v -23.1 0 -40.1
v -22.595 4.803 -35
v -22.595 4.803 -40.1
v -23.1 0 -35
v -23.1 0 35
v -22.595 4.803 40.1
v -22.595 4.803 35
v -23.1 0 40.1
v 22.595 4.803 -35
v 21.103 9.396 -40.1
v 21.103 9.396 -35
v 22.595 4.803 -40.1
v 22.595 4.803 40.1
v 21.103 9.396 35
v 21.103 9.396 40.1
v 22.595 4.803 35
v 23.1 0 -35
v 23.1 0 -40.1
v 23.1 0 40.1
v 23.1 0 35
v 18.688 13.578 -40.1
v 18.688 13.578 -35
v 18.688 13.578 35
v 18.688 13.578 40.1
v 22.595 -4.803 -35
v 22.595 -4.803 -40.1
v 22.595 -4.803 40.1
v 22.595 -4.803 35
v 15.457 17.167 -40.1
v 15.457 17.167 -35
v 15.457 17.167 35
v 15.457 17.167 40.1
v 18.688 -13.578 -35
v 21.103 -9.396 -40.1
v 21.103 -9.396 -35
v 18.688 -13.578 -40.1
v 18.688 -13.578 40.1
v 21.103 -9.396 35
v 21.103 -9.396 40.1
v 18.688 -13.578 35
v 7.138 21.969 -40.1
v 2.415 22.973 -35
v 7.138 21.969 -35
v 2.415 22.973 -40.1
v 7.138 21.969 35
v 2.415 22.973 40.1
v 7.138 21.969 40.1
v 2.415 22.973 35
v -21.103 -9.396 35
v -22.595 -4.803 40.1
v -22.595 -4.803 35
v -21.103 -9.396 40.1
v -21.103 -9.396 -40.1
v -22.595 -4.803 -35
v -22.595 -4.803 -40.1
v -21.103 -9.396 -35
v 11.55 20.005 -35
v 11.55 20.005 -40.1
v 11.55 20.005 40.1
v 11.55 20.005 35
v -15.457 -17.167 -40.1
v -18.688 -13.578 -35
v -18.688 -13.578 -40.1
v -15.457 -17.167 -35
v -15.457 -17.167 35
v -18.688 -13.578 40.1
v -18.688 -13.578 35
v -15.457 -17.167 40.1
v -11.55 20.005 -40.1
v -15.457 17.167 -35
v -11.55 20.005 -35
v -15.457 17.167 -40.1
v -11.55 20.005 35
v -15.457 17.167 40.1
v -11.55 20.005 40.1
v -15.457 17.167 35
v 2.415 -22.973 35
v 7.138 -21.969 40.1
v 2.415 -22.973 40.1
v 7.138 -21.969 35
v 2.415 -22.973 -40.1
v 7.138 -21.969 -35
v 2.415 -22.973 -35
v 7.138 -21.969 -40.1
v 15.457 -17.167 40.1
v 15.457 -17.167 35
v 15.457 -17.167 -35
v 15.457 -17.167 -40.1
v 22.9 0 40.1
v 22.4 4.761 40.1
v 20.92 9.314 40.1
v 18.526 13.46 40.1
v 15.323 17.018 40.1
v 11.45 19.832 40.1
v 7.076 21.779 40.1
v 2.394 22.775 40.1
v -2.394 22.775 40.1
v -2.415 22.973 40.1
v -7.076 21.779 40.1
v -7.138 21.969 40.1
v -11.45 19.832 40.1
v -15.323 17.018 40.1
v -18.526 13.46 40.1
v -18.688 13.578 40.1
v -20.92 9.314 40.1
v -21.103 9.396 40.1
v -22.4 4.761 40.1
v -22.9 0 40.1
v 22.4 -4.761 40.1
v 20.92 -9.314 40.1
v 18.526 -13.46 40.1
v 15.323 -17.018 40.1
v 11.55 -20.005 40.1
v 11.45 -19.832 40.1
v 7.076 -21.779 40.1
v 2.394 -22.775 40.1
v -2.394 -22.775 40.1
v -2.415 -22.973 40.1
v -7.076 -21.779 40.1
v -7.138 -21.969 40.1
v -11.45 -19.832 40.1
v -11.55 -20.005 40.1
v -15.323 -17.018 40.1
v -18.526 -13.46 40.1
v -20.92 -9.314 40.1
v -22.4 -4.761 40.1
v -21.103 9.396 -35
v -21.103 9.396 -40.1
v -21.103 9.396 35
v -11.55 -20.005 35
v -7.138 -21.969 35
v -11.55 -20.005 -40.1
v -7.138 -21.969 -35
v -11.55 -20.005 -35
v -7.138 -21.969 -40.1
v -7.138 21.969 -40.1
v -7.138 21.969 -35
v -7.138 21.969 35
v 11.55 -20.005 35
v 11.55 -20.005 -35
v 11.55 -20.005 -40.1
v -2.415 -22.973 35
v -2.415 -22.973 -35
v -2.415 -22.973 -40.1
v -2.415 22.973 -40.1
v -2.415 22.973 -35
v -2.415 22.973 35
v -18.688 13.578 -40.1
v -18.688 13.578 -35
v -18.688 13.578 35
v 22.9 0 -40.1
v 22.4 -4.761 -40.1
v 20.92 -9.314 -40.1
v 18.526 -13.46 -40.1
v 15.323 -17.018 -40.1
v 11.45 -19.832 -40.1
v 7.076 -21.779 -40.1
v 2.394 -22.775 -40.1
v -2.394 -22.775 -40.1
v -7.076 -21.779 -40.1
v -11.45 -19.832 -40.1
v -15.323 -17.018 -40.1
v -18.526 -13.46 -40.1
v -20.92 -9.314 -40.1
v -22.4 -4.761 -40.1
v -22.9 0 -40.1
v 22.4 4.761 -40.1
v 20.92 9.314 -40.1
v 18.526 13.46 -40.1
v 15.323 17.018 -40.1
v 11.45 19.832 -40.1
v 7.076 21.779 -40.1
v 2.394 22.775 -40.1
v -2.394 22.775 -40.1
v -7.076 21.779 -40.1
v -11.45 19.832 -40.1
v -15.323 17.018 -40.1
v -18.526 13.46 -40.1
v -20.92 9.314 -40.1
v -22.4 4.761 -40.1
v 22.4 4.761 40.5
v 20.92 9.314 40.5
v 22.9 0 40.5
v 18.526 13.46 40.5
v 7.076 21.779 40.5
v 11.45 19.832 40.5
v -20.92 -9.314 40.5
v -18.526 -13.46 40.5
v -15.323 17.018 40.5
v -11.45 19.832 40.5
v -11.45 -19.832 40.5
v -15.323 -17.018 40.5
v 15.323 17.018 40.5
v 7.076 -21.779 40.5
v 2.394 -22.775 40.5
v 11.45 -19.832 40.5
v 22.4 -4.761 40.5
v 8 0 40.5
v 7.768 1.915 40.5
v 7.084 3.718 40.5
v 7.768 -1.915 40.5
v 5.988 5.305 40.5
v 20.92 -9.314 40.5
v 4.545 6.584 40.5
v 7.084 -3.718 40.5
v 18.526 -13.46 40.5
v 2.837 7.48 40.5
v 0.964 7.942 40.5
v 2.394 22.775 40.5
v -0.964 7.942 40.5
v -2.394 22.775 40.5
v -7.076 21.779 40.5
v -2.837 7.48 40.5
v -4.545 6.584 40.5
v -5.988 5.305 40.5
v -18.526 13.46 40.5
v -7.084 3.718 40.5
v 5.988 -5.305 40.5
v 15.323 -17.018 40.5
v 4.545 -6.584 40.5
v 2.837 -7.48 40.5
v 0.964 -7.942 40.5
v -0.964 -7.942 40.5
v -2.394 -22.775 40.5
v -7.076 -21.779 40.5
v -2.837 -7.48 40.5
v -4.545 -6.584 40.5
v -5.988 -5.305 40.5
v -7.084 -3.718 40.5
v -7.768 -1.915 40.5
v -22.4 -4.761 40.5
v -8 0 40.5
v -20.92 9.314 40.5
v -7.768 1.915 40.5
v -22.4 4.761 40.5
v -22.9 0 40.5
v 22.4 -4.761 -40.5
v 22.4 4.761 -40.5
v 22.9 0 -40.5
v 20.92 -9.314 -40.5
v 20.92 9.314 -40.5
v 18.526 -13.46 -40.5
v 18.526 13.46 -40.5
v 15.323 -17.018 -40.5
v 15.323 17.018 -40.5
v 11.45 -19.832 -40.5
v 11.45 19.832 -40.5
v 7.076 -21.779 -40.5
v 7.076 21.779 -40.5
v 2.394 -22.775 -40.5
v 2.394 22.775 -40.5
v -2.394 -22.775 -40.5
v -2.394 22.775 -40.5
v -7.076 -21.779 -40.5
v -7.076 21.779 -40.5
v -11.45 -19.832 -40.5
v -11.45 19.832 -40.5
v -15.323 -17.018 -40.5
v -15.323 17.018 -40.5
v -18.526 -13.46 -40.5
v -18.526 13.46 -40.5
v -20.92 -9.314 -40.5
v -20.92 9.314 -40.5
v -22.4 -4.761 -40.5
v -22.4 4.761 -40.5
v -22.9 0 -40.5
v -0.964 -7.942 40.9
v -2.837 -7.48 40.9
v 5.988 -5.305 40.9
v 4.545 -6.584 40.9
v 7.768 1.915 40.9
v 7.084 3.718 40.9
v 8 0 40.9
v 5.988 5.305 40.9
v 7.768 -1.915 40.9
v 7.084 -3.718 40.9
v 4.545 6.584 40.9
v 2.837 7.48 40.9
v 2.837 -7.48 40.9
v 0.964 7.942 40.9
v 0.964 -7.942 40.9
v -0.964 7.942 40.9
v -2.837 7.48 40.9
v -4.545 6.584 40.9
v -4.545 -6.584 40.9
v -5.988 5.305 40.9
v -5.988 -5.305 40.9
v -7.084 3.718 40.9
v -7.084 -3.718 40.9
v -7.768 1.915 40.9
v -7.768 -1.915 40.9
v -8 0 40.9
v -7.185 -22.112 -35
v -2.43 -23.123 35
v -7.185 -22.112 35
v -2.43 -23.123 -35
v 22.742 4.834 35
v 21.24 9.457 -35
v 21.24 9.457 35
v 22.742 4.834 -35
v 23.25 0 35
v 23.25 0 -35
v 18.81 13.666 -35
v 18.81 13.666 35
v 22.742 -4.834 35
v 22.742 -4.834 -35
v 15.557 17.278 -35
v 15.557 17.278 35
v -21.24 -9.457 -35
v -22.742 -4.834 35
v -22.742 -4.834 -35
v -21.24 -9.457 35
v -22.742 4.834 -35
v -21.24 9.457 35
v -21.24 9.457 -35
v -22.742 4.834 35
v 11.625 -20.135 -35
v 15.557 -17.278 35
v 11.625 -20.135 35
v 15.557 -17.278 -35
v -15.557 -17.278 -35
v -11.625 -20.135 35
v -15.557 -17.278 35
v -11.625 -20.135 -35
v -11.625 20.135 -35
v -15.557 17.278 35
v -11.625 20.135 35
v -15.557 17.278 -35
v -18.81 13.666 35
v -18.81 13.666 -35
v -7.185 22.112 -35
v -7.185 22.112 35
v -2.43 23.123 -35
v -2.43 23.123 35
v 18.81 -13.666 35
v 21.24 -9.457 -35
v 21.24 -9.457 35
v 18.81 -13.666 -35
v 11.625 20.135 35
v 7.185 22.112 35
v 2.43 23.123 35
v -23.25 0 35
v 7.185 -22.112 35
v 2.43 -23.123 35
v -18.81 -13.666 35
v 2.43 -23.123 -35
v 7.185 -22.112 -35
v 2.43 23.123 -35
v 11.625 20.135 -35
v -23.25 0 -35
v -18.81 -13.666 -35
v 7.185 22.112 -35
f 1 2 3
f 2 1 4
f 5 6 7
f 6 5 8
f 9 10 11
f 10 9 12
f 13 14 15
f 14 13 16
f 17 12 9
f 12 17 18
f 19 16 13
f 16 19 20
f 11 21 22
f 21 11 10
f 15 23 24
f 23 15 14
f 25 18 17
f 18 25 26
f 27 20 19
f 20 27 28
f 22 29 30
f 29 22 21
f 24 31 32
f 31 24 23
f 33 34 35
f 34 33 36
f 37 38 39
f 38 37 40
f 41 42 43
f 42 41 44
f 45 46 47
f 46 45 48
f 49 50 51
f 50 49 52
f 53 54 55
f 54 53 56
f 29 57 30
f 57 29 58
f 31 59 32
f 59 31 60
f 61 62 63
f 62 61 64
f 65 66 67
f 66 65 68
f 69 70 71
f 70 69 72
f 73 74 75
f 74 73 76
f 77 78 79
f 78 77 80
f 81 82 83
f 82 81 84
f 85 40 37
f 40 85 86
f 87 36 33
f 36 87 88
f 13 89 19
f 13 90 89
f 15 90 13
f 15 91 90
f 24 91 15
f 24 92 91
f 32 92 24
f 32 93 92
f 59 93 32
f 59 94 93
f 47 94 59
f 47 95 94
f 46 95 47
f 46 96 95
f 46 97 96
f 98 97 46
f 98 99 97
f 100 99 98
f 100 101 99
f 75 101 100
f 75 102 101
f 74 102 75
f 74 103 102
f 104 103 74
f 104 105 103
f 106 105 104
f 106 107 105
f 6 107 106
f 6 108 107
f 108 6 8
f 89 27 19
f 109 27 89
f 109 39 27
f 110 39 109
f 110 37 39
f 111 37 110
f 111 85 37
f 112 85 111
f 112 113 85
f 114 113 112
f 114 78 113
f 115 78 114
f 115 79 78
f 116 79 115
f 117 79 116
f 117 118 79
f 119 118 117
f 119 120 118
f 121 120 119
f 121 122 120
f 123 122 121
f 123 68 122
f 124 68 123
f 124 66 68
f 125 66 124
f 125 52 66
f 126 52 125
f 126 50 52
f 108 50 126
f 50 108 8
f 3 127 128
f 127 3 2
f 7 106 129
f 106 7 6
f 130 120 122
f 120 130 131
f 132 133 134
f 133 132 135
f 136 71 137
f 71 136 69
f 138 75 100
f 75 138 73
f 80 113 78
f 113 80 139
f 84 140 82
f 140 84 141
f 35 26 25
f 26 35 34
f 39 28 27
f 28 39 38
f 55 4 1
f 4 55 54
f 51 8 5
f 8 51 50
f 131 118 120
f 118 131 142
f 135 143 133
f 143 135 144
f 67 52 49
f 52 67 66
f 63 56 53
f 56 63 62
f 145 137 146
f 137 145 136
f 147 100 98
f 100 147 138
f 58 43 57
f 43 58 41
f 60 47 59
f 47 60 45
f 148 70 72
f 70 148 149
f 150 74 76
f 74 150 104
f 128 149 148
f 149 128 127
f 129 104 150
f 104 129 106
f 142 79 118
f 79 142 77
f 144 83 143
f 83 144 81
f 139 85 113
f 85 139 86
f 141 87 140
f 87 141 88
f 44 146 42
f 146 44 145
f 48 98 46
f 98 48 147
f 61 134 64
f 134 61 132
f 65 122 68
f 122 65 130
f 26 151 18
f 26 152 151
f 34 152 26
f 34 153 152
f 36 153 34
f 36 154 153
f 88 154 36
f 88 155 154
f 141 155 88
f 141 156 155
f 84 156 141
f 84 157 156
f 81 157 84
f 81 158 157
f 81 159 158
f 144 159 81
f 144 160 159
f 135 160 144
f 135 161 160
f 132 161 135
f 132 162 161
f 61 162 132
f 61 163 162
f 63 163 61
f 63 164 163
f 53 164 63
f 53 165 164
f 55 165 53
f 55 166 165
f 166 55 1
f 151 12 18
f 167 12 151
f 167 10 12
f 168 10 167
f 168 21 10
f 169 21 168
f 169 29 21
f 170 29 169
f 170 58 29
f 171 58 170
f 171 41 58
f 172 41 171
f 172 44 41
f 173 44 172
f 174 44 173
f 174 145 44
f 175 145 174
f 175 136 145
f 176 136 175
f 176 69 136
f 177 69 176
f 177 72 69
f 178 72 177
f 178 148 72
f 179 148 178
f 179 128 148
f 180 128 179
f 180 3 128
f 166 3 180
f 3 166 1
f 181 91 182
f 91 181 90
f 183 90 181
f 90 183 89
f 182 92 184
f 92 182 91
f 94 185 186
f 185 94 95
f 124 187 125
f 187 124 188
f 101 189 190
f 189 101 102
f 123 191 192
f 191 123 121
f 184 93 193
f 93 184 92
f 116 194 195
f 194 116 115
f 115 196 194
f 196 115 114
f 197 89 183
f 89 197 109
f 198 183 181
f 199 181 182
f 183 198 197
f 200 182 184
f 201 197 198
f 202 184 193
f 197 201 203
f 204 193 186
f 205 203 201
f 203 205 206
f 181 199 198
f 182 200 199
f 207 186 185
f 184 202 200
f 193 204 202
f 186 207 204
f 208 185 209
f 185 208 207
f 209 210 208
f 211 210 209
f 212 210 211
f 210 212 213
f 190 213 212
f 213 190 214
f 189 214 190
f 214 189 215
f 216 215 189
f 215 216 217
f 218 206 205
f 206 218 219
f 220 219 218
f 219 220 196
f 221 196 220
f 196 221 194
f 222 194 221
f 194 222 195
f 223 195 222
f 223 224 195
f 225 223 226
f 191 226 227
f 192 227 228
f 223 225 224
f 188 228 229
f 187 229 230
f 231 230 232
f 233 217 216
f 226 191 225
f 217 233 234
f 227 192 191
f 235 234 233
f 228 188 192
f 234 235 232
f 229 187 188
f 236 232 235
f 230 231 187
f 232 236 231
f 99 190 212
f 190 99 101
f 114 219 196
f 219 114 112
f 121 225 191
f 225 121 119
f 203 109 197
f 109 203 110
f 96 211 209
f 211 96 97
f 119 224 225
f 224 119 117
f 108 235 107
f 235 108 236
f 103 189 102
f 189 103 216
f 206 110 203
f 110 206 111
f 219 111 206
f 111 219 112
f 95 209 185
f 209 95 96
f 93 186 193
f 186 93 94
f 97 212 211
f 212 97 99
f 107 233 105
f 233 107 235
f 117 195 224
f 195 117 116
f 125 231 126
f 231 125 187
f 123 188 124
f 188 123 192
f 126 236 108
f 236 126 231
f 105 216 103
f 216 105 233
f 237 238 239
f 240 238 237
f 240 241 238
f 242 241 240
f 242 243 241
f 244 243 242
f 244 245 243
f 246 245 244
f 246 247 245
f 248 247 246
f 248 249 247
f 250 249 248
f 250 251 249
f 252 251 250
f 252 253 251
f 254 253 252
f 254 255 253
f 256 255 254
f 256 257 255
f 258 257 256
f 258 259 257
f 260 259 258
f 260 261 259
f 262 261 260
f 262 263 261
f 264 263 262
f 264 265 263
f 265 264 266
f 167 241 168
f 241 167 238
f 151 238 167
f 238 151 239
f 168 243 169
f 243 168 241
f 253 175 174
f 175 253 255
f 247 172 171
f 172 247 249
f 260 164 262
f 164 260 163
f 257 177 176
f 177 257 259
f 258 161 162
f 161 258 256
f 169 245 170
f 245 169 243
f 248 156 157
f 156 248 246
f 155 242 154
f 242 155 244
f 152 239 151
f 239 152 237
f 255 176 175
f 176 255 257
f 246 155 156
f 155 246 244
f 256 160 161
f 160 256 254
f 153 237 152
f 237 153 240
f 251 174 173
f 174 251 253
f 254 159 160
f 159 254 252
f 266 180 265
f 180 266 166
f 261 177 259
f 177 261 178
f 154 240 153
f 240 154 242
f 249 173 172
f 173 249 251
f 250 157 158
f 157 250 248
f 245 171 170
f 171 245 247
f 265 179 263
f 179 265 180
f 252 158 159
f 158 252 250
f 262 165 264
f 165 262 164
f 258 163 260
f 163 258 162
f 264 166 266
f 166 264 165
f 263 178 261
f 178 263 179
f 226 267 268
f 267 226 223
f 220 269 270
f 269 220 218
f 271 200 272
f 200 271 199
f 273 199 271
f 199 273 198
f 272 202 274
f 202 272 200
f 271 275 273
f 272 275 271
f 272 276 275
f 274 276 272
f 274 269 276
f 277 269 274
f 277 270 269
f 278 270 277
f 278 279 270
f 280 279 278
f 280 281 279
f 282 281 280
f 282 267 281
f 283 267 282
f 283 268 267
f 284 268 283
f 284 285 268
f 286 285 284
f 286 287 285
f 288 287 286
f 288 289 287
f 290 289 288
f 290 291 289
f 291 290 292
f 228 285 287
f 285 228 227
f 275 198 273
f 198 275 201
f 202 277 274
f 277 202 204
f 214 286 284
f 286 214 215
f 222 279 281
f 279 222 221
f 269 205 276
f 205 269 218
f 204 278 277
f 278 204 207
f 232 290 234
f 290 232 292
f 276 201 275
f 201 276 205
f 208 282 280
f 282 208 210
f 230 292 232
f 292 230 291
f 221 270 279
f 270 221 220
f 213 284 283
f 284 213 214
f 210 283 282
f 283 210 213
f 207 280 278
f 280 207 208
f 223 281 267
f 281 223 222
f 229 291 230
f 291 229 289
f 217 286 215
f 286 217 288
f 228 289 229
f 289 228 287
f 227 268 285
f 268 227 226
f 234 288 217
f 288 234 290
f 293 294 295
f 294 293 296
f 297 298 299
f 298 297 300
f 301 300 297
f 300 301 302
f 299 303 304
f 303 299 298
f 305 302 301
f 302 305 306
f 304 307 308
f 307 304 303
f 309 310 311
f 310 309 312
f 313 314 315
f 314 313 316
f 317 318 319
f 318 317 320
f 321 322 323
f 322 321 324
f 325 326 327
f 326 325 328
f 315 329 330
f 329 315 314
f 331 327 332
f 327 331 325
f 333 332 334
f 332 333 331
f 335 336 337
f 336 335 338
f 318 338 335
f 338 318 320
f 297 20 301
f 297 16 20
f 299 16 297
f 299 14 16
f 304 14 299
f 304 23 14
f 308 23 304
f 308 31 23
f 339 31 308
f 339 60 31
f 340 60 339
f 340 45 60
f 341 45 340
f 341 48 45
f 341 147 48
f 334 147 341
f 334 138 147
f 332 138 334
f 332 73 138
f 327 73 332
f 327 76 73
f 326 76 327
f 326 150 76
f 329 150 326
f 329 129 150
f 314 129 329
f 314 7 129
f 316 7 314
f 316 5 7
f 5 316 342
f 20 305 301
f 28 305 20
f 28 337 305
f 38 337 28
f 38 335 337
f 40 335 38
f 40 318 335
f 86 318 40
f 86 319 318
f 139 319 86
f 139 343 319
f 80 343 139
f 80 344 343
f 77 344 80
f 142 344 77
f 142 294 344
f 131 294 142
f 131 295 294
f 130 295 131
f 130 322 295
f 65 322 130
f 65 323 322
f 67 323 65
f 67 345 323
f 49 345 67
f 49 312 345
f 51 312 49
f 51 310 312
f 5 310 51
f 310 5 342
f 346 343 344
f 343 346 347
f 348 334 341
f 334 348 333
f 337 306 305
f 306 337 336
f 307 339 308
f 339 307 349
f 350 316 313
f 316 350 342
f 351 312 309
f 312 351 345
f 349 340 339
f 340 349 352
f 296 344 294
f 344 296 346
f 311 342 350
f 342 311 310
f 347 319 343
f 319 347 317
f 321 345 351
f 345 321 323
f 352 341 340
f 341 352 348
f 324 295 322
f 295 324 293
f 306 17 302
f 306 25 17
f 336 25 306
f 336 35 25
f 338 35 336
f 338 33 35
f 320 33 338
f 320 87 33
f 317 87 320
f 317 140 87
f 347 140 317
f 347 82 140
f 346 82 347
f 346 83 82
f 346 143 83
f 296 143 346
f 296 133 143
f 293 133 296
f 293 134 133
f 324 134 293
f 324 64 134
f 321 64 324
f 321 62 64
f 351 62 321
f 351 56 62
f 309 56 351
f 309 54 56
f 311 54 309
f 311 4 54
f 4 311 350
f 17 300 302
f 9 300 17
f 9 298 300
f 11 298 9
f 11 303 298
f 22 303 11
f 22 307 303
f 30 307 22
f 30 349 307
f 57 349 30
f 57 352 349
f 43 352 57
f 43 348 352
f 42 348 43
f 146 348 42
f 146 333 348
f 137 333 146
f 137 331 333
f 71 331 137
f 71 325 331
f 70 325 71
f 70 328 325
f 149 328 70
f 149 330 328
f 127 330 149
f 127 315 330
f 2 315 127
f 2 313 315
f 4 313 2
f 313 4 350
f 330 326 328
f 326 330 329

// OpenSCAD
// Parameters
cell_height = 80.2; //[40.1:160.4:0.1]
cell_diameter = 46.2; //[23.1:92.4:0.1]
cap_height = 1.0; //[0.5:2.0:0.1]
cap_inset = 0.2; //[0.1:0.6:0.05]
label_thickness = 0.15; //[0.05:0.4:0.05]
label_height = 70.0; //[35.0:78.2:0.1]
terminal_button_diameter = 16.0; //[8.0:24.0:0.1]
terminal_button_height = 1.6; //[0.8:3.2:0.1]
insulator_outer_diameter = 22.0; //[12.0:34.0:0.1]
insulator_inner_diameter = 17.0; //[9.0:28.0:0.1]
insulator_thickness = 0.6; //[0.3:1.2:0.05]
fillet_radius = 0.8; //[0.3:2.0:0.1]
overlap = 0.8; //[0.5:2.0:0.1]

// Base Shapes
module cell_body() {
  color("Silver")
  cylinder(h=cell_height, r=cell_diameter/2, center=true);
}

module top_cap() {
  color("DimGray")
  translate([0, 0, cell_height/2 - cap_height/2 + overlap/2])
  cylinder(h=cap_height, r=cell_diameter/2 - cap_inset, center=true);
}

module bottom_cap() {
  color("DimGray")
  translate([0, 0, -cell_height/2 + cap_height/2 - overlap/2])
  cylinder(h=cap_height, r=cell_diameter/2 - cap_inset, center=true);
}

module positive_terminal_button() {
  color("Gold")
  translate([0, 0, cell_height/2 + terminal_button_height/2 - overlap])
  cylinder(h=terminal_button_height, r=terminal_button_diameter/2, center=true);
}

module insulator_ring() {
  color("Black")
  difference() {
    translate([0, 0, cell_height/2 + insulator_thickness/2 - overlap])
    cylinder(h=insulator_thickness, r=insulator_outer_diameter/2, center=true);
    translate([0, 0, cell_height/2 + insulator_thickness/2 - overlap])
    cylinder(h=insulator_thickness + overlap*2, r=insulator_inner_diameter/2, center=true);
  }
}

module label_wrap() {
  color("Blue")
  cylinder(h=label_height, r=cell_diameter/2 + label_thickness, center=true);
}

module edge_fillet_top() {
  translate([0, 0, cell_height/2 - fillet_radius + overlap/2])
  rotate_extrude() translate([cell_diameter/2 - fillet_radius, 0, 0]) circle(r=fillet_radius);
}

module edge_fillet_bottom() {
  translate([0, 0, -cell_height/2 + fillet_radius - overlap/2])
  rotate_extrude() translate([cell_diameter/2 - fillet_radius, 0, 0]) circle(r=fillet_radius);
}

module edge_fillets() {
  union() {
    edge_fillet_top();
    edge_fillet_bottom();
  }
}

// Final Assembly
module battery_complete() {
  union() {
    cell_body();
    top_cap();
    bottom_cap();
    positive_terminal_button();
    insulator_ring();
    label_wrap();
    edge_fillets();
  }
}

// Render the complete battery
battery_complete();
